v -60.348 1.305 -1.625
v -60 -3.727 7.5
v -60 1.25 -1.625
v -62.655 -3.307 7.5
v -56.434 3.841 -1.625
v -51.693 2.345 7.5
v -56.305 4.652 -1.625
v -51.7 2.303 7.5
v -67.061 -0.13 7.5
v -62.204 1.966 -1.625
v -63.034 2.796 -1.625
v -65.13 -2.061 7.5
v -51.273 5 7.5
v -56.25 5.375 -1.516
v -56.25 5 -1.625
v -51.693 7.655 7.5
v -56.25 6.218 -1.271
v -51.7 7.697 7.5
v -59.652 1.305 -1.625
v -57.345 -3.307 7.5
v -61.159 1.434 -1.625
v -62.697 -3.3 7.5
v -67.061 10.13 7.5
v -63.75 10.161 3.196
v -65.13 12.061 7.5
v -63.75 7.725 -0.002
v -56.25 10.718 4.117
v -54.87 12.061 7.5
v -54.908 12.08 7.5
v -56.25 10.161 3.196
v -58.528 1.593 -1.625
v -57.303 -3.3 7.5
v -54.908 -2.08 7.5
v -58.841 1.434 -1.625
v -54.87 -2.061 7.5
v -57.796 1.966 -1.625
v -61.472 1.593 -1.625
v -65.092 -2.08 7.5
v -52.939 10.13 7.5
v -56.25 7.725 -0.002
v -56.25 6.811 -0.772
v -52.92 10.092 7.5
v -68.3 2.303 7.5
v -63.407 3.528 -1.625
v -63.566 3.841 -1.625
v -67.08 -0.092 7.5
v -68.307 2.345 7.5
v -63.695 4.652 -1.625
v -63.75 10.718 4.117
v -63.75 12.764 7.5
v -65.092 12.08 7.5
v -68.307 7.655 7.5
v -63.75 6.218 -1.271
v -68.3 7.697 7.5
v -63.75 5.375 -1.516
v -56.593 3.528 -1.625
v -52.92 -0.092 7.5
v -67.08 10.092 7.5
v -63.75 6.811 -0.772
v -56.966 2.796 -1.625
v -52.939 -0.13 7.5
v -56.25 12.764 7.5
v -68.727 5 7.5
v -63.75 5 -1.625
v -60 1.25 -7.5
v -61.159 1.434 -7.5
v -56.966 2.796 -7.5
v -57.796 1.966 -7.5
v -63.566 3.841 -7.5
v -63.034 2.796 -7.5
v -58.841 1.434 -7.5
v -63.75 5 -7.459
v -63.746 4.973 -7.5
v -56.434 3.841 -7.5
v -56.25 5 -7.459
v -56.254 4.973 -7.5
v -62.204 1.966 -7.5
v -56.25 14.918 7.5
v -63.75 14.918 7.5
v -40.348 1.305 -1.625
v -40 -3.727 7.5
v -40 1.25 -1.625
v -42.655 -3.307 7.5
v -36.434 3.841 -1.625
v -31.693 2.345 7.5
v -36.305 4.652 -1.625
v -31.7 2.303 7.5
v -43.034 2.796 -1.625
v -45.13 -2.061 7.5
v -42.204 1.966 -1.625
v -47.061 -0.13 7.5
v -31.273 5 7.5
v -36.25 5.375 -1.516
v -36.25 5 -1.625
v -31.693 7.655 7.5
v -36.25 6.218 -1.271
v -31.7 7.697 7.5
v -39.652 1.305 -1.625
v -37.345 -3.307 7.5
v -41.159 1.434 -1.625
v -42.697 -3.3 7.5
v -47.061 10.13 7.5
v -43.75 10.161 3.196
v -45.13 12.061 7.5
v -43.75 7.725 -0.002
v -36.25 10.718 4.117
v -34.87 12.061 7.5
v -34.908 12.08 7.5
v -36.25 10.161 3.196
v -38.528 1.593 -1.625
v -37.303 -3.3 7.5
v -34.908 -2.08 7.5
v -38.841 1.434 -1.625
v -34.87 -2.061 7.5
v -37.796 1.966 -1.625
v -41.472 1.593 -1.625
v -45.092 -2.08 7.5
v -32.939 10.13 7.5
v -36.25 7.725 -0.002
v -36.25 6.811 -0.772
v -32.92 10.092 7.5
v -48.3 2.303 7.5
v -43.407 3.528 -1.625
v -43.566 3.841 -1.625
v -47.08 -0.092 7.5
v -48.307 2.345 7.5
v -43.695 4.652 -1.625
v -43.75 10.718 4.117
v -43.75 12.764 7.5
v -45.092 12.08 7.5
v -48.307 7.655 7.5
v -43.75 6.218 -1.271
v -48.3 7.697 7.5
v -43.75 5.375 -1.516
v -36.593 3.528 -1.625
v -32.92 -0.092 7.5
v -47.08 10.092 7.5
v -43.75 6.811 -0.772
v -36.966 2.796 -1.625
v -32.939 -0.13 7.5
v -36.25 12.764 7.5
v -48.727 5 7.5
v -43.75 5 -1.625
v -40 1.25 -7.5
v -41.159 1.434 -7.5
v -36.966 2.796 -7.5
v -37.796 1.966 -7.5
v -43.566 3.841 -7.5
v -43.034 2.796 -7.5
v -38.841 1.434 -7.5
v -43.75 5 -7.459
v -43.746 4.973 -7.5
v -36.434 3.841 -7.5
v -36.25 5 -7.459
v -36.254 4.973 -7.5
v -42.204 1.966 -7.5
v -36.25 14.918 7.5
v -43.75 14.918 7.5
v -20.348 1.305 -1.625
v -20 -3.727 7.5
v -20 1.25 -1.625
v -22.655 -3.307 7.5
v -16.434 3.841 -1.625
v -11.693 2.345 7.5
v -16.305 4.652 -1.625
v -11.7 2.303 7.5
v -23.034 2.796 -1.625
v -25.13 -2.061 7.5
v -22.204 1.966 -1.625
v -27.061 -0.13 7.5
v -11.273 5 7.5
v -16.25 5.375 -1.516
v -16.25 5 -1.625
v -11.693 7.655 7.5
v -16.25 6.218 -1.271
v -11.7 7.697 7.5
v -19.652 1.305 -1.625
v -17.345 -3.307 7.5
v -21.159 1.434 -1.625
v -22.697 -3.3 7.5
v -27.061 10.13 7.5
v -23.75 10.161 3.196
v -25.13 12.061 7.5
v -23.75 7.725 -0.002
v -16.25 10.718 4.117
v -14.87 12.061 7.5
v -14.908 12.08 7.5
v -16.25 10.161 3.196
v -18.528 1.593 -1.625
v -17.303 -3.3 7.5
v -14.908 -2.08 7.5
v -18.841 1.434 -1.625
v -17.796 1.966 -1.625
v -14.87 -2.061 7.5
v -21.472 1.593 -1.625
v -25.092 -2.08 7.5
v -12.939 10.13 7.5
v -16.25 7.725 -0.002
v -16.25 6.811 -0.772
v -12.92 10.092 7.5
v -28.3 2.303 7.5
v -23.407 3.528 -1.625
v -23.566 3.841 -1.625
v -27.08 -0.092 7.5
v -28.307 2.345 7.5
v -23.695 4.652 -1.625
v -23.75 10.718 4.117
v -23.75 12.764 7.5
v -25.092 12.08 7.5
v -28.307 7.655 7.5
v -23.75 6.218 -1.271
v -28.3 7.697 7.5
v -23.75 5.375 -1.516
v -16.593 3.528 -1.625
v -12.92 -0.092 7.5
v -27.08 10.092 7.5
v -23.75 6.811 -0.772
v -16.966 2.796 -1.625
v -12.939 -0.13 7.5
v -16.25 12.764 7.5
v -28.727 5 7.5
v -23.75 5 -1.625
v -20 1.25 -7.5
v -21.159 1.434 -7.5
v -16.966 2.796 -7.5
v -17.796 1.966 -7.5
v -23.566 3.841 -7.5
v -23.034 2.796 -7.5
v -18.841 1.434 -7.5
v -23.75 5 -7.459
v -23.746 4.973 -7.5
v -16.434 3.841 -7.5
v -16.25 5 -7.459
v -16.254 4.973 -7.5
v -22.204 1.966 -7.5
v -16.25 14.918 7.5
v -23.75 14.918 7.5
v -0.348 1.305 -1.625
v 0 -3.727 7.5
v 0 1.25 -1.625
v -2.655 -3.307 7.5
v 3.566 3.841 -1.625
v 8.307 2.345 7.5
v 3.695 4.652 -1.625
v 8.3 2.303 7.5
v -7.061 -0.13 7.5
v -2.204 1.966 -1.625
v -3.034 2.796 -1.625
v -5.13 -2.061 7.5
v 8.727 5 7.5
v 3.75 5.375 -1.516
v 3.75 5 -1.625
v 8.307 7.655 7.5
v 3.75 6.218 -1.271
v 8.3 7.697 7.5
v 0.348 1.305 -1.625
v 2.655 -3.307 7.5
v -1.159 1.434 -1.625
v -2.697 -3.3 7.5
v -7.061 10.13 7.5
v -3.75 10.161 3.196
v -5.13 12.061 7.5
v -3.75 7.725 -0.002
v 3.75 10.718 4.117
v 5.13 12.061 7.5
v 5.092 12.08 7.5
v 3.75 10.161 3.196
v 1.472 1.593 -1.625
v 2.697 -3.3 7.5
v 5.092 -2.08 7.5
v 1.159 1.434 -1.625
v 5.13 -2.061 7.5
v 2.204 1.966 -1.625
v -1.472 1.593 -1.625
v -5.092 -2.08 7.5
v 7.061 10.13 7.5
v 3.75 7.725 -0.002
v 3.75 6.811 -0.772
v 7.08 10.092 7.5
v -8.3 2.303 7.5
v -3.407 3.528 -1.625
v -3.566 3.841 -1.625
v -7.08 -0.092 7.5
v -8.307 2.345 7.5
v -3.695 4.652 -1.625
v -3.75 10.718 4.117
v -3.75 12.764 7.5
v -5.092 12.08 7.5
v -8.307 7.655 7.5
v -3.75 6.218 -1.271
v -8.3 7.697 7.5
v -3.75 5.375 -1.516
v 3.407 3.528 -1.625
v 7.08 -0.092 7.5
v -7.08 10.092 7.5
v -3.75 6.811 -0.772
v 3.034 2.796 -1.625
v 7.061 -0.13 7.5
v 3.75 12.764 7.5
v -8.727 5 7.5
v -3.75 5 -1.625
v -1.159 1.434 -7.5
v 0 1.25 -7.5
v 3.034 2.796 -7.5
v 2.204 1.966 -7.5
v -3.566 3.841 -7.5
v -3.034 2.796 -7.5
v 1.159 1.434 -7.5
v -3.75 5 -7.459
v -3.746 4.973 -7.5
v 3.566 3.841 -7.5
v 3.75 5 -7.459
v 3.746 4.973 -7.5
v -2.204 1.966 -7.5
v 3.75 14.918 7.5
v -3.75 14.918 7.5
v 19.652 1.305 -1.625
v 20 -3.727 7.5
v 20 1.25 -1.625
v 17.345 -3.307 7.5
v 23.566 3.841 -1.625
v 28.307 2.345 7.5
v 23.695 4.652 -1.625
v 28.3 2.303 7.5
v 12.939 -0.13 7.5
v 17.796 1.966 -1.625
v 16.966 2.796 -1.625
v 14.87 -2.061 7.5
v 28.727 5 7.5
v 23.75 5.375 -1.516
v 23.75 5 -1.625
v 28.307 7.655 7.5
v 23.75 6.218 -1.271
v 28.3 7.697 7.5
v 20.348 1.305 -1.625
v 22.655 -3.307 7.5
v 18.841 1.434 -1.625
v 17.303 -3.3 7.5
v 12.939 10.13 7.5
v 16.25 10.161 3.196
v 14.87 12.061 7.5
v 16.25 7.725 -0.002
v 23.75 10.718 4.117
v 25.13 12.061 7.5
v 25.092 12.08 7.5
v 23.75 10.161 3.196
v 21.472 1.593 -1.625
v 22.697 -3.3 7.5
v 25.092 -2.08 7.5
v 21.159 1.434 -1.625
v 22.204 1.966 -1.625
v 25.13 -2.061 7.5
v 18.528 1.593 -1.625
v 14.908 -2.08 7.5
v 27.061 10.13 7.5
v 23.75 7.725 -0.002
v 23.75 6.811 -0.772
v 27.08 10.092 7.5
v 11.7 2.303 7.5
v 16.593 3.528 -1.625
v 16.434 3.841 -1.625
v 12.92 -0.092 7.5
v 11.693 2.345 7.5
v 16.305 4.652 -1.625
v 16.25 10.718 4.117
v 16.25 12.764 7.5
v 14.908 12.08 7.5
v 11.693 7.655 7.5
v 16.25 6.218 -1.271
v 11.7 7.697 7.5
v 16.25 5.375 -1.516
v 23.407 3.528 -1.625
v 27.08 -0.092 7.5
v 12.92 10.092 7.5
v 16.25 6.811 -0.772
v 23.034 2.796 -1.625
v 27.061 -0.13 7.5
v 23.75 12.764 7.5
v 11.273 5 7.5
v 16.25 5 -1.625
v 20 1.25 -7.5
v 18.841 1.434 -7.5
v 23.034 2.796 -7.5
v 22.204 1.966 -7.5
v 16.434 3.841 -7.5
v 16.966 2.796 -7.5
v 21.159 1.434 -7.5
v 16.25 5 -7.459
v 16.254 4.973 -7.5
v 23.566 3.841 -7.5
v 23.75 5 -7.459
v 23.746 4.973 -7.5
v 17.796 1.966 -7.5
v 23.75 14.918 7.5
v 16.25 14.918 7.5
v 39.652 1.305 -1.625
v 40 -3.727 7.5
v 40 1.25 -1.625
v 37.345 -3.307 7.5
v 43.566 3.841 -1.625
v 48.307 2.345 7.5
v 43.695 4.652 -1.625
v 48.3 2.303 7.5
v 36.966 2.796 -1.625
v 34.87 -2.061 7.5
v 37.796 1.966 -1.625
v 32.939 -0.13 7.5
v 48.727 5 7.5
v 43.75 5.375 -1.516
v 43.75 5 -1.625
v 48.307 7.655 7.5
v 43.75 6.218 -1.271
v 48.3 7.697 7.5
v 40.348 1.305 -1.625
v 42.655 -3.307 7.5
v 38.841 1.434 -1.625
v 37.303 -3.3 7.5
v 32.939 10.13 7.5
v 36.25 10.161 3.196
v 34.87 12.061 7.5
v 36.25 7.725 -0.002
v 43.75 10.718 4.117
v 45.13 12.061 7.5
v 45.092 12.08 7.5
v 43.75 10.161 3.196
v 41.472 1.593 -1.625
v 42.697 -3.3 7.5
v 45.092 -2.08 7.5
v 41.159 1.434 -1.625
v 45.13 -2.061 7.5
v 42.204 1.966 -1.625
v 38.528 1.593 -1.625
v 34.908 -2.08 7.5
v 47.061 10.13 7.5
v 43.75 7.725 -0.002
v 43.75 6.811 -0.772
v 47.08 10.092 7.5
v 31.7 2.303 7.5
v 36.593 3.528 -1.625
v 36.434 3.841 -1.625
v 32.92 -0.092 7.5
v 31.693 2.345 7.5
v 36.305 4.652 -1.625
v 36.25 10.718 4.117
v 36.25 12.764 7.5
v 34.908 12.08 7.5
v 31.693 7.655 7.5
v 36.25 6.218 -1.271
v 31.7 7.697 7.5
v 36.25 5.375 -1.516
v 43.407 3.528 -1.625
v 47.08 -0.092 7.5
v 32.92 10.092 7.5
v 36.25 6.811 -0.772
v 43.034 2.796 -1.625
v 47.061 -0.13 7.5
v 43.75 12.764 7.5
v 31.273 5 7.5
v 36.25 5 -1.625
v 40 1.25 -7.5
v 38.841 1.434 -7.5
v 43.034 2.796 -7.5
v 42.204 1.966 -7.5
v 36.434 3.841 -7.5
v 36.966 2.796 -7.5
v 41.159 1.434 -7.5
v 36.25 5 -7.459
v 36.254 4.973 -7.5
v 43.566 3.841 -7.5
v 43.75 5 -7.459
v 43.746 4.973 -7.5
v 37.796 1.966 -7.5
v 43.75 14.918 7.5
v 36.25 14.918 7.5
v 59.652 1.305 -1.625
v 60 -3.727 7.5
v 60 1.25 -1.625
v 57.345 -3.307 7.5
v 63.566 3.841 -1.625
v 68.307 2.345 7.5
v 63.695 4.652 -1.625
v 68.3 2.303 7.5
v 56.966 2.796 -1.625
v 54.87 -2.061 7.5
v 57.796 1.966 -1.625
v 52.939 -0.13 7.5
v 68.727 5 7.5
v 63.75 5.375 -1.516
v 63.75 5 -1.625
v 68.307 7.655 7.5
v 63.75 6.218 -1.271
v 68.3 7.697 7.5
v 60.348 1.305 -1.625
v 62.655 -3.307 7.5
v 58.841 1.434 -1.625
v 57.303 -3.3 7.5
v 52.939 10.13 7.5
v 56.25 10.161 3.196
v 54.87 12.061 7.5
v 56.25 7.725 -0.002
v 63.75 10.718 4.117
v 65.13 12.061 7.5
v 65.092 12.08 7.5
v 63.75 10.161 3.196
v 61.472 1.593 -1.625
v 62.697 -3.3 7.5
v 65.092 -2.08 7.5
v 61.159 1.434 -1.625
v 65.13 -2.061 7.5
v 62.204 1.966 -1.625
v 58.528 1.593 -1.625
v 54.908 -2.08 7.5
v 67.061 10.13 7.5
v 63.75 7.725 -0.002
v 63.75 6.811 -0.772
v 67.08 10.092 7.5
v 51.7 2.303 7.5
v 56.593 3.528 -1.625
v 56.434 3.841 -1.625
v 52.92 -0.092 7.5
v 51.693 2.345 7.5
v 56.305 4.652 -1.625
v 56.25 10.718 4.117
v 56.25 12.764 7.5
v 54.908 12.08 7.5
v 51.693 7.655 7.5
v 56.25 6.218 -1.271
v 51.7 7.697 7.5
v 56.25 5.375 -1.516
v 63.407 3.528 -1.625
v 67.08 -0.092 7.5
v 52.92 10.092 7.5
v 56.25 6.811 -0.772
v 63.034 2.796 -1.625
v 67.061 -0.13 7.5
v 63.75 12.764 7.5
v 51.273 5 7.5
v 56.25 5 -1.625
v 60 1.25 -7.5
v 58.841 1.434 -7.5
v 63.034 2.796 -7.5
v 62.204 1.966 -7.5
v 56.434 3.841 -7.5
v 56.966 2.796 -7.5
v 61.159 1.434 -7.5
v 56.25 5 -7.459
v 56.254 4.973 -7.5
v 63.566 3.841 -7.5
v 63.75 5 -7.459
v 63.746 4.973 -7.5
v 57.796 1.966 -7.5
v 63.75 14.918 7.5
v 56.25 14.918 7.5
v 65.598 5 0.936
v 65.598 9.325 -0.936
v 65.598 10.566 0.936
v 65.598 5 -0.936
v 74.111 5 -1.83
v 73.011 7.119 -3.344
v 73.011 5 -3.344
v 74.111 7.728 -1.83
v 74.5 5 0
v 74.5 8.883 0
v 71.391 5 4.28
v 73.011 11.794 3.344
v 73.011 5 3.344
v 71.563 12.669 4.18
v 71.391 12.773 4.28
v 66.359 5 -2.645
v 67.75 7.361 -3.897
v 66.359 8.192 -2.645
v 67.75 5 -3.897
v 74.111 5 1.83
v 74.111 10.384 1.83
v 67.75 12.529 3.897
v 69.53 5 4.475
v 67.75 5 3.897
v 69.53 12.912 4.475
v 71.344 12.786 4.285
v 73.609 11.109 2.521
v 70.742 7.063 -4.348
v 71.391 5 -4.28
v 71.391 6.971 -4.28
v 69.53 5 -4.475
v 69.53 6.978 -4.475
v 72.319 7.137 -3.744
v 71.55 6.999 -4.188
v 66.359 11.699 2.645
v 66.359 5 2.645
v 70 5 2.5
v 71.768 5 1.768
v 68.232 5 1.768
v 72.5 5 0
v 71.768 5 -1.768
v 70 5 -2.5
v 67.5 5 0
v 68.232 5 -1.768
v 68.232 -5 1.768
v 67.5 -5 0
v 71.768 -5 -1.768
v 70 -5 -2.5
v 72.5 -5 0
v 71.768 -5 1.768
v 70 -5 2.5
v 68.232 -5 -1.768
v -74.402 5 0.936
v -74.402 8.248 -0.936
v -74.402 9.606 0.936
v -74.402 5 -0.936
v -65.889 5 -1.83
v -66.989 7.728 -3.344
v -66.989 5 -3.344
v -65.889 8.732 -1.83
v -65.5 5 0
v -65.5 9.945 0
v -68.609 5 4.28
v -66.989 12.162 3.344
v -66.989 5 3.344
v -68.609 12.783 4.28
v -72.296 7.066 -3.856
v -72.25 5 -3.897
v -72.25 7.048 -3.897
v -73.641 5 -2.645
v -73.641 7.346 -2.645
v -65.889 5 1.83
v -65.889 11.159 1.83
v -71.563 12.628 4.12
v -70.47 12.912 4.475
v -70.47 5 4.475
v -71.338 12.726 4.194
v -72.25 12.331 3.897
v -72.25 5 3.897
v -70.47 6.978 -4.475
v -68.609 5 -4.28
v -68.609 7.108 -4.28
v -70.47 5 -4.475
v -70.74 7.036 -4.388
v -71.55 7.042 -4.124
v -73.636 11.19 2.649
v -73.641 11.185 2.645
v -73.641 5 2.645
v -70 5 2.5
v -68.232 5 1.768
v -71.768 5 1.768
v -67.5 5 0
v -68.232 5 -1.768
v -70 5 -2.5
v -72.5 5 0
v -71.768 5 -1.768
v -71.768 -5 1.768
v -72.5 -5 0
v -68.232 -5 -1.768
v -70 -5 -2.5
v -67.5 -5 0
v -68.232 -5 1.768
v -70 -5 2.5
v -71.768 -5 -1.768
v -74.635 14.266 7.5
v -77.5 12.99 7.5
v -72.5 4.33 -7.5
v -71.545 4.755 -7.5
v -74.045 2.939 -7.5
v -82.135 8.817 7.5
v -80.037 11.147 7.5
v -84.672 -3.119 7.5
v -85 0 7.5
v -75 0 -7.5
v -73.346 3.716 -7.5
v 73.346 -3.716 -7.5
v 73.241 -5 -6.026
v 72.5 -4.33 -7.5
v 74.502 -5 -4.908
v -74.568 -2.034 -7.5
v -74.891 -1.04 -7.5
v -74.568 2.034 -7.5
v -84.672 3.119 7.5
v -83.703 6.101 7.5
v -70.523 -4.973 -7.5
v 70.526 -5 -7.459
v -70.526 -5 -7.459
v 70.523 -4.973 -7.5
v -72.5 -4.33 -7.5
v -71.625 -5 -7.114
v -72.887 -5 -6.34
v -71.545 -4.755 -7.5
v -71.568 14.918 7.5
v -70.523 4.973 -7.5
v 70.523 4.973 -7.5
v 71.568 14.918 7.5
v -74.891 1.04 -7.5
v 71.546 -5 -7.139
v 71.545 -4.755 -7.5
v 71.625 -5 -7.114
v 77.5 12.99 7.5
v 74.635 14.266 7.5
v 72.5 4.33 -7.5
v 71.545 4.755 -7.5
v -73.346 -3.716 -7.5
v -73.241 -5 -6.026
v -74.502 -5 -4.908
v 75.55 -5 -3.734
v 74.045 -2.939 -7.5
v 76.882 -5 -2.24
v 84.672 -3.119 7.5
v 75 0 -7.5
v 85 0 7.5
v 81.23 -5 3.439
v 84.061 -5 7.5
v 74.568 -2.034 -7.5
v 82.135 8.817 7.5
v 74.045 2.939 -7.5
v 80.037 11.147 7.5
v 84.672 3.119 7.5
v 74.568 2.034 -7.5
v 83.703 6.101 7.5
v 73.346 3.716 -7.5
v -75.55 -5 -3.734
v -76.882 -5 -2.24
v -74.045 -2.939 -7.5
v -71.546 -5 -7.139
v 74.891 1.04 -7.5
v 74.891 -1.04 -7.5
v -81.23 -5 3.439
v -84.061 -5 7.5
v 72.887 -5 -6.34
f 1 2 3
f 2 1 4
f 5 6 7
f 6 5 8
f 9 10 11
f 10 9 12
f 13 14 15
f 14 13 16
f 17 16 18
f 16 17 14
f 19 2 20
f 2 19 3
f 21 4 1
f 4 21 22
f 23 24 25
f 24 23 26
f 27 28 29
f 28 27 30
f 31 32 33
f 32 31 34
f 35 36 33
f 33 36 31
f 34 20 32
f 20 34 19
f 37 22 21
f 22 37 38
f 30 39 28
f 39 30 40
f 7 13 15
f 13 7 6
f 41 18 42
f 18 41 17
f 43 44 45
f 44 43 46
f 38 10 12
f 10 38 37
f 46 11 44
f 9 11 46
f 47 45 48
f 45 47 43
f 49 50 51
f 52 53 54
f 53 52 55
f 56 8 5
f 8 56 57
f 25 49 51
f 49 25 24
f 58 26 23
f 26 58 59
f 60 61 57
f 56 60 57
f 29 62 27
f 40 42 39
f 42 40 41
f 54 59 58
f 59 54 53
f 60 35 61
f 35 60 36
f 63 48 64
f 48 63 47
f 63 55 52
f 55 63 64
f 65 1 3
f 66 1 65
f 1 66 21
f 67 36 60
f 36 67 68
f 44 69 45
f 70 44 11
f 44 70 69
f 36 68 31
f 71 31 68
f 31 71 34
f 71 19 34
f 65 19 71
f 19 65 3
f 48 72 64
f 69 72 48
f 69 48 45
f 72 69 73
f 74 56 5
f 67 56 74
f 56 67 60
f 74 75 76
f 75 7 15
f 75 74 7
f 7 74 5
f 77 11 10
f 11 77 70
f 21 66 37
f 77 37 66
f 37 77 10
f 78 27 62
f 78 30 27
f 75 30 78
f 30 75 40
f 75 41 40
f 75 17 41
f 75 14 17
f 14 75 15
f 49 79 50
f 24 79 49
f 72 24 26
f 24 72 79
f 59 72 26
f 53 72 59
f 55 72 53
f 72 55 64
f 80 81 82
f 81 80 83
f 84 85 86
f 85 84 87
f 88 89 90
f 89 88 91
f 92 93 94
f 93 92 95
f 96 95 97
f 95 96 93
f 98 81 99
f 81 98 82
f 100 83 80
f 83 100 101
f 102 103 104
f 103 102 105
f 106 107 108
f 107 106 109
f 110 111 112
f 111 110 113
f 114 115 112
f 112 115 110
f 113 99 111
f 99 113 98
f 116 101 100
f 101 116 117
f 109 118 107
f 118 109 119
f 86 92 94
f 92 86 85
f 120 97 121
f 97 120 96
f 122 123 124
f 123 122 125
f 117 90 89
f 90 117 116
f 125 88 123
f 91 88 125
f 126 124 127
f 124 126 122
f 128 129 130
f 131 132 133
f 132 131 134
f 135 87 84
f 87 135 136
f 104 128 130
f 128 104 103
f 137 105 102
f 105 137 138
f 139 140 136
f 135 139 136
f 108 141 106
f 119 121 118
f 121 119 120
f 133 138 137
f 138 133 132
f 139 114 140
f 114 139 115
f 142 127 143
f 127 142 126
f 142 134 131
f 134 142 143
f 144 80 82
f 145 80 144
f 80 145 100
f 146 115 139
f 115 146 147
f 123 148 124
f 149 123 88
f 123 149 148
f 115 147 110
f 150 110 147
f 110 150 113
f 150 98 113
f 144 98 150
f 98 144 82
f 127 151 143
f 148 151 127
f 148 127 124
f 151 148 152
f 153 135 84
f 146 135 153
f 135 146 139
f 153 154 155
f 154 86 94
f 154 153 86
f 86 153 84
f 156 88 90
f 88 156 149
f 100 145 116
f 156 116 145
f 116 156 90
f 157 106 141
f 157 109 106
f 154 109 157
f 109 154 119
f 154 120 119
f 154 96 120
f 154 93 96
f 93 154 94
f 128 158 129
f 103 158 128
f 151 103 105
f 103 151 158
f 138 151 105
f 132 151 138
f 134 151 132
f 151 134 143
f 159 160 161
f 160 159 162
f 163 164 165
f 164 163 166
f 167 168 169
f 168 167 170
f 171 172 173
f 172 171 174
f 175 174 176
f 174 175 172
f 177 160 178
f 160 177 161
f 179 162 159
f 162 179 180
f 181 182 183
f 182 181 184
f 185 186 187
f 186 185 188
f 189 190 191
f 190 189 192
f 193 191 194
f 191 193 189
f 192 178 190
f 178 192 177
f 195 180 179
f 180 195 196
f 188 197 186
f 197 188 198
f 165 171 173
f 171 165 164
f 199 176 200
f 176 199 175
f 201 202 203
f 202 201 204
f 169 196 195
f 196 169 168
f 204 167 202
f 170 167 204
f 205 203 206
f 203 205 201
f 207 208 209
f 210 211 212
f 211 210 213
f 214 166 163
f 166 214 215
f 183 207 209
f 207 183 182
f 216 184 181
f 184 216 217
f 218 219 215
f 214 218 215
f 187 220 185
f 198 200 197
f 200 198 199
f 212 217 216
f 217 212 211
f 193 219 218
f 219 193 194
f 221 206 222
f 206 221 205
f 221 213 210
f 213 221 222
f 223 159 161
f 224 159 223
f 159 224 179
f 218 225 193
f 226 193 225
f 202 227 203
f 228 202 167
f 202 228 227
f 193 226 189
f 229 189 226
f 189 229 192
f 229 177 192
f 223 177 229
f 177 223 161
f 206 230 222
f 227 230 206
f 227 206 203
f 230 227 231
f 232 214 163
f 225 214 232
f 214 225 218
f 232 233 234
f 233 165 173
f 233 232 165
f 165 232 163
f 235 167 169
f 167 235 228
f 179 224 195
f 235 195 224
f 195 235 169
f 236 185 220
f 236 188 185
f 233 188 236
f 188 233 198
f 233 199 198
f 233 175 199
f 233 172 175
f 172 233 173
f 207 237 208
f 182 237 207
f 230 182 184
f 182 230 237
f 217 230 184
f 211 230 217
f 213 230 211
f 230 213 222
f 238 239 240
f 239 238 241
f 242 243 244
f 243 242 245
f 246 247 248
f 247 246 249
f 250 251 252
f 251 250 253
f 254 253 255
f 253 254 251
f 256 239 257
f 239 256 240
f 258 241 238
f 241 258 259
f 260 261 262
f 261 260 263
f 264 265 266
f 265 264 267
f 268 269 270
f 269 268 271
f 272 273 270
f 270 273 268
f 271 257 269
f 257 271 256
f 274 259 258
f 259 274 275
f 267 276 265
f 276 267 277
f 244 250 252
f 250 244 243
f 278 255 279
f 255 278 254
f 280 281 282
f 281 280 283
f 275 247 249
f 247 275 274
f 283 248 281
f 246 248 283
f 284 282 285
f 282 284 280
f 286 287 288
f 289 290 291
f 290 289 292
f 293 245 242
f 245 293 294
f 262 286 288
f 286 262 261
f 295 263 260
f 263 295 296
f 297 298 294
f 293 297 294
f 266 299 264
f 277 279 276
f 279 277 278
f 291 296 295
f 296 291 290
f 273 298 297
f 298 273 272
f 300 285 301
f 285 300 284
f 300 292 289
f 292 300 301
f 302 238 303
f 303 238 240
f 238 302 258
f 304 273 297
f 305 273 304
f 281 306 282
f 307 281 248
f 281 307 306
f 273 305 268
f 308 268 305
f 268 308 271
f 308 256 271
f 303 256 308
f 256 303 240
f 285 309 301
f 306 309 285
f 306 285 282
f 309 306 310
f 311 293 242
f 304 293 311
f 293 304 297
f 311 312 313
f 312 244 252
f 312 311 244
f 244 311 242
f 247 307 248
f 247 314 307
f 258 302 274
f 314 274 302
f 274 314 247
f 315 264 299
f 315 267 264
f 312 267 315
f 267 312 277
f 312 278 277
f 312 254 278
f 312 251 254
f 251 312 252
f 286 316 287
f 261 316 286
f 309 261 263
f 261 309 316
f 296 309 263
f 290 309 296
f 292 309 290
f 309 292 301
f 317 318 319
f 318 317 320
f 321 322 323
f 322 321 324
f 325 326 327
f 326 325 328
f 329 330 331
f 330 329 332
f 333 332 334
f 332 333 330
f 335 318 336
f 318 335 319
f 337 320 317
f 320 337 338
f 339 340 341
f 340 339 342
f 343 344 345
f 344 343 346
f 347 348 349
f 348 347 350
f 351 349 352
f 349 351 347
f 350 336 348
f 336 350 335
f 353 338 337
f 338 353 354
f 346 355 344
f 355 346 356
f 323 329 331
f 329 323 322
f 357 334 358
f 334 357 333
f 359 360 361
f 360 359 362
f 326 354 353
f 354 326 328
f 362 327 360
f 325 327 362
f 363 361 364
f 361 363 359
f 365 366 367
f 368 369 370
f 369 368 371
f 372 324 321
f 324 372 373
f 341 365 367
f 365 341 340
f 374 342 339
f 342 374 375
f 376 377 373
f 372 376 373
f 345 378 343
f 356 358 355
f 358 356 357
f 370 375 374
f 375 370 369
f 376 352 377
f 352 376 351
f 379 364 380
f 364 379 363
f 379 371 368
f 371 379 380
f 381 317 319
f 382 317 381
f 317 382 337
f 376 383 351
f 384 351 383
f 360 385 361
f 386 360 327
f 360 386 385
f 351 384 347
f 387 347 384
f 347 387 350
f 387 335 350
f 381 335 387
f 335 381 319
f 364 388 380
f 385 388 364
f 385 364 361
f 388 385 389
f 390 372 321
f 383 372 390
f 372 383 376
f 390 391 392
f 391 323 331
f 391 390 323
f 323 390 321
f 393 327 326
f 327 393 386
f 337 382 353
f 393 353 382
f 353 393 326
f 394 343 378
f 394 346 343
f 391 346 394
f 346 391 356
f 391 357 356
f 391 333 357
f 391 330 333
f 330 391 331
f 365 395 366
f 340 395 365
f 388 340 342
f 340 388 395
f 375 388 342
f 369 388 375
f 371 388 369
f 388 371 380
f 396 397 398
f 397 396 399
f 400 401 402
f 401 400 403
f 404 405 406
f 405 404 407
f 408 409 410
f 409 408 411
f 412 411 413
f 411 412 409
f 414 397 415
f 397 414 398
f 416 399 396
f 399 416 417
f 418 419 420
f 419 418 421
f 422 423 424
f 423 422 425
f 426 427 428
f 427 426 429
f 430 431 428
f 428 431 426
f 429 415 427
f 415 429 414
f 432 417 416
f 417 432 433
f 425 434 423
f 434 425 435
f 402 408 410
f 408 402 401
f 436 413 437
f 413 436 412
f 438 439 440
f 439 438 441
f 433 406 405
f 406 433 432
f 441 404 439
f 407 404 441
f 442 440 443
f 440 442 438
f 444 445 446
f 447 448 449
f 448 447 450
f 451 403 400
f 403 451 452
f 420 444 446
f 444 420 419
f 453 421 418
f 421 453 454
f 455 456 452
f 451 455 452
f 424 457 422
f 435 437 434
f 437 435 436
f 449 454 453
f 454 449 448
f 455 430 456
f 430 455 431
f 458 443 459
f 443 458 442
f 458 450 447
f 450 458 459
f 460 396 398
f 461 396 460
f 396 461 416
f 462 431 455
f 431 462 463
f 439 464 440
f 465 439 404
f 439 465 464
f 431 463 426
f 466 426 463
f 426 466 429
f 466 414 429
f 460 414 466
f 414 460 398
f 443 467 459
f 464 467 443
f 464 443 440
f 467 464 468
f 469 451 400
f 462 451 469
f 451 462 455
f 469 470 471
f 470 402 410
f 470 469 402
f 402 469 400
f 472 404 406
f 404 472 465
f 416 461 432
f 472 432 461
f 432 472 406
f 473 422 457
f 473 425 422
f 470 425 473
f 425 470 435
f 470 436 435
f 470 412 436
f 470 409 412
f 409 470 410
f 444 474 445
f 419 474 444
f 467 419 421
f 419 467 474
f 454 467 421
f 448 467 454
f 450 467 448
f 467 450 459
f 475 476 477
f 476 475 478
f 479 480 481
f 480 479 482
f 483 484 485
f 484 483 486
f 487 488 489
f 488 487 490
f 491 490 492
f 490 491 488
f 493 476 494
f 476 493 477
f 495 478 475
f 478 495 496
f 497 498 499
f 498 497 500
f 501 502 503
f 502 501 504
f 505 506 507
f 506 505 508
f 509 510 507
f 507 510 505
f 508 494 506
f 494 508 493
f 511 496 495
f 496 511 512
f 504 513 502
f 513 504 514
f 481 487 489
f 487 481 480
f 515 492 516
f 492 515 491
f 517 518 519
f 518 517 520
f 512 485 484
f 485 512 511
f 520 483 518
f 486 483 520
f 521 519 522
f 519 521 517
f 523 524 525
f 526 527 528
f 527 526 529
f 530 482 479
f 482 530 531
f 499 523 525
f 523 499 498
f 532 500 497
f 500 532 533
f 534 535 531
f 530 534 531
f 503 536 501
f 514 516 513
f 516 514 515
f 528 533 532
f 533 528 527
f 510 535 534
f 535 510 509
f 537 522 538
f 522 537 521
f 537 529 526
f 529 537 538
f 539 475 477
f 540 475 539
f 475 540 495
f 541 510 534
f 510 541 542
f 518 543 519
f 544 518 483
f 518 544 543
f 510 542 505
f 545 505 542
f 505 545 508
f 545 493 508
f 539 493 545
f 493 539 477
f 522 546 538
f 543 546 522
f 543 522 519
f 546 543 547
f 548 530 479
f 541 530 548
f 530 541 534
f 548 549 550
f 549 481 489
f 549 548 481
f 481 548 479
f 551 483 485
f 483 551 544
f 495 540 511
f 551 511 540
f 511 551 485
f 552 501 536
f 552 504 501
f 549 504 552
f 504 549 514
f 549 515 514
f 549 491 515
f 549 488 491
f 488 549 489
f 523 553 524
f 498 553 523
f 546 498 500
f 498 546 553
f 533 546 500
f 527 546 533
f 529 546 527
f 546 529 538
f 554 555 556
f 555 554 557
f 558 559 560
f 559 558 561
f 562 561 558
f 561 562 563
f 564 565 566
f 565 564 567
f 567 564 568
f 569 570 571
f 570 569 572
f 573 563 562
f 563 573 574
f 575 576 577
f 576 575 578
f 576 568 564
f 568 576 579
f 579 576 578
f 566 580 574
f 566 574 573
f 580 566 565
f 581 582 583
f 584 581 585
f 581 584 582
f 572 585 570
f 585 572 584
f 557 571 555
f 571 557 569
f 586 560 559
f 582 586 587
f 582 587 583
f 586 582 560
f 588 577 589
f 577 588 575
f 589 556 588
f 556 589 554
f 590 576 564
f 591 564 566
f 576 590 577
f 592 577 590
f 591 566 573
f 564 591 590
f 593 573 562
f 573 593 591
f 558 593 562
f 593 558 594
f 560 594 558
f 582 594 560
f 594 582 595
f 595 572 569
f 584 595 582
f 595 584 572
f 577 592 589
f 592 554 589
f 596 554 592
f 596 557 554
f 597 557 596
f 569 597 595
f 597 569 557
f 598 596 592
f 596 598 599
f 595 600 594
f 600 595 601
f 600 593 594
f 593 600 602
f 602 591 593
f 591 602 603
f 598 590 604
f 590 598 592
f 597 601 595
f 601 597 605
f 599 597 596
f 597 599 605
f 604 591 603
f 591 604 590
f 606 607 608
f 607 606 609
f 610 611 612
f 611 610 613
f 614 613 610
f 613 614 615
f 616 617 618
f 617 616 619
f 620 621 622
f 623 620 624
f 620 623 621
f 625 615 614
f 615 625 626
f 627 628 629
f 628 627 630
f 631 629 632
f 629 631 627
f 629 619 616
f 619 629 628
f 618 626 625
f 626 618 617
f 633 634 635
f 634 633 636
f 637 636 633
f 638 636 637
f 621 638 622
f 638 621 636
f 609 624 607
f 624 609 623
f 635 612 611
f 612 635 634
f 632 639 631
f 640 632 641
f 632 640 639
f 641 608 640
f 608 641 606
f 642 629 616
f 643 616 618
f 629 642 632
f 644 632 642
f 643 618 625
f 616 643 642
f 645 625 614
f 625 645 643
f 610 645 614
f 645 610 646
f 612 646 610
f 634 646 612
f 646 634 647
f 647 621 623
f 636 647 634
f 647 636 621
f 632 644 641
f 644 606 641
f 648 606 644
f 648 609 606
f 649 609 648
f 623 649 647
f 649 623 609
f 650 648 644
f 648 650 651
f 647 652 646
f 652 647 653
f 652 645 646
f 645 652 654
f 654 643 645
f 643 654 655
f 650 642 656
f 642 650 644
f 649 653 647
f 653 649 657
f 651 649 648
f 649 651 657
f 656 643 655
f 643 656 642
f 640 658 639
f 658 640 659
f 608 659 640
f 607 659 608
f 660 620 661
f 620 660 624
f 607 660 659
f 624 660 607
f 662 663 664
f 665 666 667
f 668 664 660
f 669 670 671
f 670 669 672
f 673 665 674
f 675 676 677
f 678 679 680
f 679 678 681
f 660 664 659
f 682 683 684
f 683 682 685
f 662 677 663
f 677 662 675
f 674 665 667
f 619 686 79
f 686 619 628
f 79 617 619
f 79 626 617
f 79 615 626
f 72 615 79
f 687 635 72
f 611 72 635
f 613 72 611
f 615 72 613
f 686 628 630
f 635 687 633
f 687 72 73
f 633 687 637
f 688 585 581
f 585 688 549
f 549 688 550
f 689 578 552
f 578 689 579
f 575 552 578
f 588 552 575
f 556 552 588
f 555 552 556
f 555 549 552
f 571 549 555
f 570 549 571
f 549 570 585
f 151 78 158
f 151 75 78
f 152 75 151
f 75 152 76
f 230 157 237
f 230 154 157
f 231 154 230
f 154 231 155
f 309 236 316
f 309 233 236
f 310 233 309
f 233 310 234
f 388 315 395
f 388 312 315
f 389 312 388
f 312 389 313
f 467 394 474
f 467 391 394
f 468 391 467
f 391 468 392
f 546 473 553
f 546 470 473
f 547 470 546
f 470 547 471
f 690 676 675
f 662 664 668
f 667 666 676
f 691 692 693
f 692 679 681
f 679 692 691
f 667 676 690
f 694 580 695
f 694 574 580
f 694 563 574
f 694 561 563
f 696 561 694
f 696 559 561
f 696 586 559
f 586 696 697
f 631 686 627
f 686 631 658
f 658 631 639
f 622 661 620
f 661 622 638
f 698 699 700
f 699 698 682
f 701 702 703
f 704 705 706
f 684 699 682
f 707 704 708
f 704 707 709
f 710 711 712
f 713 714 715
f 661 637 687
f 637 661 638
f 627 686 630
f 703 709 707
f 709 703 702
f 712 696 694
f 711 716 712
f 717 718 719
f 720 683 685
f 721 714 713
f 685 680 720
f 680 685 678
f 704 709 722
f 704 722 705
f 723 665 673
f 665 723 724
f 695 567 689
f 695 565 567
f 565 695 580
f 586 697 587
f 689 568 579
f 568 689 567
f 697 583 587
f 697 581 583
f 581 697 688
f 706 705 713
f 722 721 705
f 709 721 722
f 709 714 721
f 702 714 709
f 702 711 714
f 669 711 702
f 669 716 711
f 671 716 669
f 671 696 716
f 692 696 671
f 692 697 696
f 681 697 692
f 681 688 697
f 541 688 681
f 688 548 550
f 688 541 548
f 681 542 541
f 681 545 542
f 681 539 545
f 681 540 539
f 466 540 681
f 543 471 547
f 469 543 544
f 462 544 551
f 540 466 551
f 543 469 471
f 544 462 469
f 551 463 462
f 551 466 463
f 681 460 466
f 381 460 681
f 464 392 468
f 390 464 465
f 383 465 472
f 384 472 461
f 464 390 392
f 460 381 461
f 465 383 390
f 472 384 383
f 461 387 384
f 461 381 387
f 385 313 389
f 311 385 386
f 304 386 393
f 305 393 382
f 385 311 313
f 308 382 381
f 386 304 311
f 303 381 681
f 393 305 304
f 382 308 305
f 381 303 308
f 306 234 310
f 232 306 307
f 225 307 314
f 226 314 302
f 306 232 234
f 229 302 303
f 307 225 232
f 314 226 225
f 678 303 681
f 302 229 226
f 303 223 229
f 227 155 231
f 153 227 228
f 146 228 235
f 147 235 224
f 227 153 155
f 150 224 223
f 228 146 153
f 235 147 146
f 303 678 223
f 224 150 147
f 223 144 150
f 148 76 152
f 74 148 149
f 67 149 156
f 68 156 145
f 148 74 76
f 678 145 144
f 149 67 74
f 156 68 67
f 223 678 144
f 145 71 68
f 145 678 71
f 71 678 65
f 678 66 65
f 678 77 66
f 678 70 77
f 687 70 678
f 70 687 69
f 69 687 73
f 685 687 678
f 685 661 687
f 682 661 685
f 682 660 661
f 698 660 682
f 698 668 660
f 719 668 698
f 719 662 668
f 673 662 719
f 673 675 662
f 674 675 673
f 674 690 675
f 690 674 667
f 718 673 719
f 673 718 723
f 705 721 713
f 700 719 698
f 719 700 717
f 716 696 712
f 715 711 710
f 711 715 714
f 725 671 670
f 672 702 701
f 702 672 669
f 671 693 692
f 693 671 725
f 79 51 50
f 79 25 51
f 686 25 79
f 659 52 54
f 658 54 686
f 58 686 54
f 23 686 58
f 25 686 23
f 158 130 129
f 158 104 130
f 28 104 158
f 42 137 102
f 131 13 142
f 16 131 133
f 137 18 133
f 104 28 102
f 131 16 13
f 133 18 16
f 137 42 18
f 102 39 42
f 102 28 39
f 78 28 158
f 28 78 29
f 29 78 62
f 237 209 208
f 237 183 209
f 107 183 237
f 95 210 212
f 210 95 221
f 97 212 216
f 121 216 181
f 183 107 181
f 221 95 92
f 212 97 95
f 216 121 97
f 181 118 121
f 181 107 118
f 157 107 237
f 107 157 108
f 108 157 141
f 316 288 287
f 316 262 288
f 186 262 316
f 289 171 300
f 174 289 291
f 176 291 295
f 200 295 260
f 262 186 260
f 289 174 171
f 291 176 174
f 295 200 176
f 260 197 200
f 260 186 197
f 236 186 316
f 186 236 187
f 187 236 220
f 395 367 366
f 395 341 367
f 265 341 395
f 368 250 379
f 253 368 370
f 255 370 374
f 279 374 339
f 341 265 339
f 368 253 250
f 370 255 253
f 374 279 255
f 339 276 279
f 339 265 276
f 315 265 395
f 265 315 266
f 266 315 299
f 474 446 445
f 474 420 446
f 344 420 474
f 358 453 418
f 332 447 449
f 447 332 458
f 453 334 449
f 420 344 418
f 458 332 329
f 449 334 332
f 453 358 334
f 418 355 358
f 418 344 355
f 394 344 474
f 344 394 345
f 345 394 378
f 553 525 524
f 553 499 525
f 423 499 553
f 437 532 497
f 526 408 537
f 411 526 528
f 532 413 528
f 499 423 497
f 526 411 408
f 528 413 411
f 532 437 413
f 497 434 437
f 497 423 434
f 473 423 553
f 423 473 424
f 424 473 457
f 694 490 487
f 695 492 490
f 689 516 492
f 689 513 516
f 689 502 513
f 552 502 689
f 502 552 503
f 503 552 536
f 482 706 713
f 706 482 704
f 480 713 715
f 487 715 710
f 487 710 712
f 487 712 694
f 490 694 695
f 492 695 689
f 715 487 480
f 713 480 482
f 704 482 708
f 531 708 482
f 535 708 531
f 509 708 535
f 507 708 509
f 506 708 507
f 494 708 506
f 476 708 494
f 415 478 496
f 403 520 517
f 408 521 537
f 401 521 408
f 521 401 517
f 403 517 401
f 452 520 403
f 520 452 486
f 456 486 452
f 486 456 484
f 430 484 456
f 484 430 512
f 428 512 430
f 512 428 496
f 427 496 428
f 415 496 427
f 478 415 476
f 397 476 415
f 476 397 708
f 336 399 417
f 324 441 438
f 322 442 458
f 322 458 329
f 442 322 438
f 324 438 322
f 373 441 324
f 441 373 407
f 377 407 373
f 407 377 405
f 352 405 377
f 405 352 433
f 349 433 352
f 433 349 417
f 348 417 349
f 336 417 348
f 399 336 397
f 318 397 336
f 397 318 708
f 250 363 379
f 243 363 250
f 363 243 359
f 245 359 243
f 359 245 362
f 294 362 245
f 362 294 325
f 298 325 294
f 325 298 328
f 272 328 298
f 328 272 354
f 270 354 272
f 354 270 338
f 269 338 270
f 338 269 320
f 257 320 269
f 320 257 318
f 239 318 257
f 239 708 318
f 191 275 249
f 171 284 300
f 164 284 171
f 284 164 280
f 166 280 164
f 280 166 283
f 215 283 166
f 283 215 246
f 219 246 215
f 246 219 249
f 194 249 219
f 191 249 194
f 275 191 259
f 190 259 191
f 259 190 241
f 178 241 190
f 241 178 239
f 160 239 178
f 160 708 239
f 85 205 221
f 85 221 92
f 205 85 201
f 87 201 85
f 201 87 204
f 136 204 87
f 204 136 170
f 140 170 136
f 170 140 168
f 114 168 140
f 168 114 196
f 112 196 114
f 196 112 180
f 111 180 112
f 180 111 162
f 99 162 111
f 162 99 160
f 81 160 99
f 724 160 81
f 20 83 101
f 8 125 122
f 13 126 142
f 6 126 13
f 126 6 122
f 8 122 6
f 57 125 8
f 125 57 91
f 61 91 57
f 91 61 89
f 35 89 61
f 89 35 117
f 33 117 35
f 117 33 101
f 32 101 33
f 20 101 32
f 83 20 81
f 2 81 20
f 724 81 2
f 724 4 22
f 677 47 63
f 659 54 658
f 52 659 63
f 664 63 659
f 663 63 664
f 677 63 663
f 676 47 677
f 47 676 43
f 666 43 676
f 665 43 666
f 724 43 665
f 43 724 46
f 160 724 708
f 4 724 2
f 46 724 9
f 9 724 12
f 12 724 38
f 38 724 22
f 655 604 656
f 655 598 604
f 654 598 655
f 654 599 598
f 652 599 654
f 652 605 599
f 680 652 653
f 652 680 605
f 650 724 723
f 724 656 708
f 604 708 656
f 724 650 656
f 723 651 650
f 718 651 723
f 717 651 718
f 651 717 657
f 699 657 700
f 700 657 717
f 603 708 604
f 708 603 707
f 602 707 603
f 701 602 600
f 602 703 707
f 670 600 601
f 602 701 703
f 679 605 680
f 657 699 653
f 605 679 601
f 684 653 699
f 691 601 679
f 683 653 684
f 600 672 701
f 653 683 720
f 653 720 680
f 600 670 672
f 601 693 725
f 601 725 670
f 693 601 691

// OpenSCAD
module cableHole() {
translate ([0,0,5])
cylinder (d1=6, d2=18,h=11,$fn=20,center=true) ;
cylinder (d=7.5, h=11,$fn=20, center =true );
translate ([0,5,2.5])
cube ([7.5,10,20], center =true );
}
difference () {
hull() {
translate ([70,0,0])
cylinder (d1=10,d2=30,h=15,center=true);
translate ([-70,0,0])
cylinder (d1=10,d2=30,h=15,center=true);
} 
translate ([0,-15, 0])
cube ([200,20,20], center =true );
for(i=[-3:3]){
translate ([i*20,5,-2.5])
cableHole ();
}
translate ([70,0,0])
rotate ([-90,0,0]){
union () {
translate ([0,0,10])
cylinder (d=9,h=10,center =true) ;
cylinder (d=5,h=30,center =true) ;
} 
} 
translate ([-70,0,0])
rotate ([-90,0,0]){
union() {
translate ([0,0,10])
cylinder (d=9,h=10,center =true) ;
cylinder (d=5,h=30,center =true) ;
} 
} 
}
echo("test");
